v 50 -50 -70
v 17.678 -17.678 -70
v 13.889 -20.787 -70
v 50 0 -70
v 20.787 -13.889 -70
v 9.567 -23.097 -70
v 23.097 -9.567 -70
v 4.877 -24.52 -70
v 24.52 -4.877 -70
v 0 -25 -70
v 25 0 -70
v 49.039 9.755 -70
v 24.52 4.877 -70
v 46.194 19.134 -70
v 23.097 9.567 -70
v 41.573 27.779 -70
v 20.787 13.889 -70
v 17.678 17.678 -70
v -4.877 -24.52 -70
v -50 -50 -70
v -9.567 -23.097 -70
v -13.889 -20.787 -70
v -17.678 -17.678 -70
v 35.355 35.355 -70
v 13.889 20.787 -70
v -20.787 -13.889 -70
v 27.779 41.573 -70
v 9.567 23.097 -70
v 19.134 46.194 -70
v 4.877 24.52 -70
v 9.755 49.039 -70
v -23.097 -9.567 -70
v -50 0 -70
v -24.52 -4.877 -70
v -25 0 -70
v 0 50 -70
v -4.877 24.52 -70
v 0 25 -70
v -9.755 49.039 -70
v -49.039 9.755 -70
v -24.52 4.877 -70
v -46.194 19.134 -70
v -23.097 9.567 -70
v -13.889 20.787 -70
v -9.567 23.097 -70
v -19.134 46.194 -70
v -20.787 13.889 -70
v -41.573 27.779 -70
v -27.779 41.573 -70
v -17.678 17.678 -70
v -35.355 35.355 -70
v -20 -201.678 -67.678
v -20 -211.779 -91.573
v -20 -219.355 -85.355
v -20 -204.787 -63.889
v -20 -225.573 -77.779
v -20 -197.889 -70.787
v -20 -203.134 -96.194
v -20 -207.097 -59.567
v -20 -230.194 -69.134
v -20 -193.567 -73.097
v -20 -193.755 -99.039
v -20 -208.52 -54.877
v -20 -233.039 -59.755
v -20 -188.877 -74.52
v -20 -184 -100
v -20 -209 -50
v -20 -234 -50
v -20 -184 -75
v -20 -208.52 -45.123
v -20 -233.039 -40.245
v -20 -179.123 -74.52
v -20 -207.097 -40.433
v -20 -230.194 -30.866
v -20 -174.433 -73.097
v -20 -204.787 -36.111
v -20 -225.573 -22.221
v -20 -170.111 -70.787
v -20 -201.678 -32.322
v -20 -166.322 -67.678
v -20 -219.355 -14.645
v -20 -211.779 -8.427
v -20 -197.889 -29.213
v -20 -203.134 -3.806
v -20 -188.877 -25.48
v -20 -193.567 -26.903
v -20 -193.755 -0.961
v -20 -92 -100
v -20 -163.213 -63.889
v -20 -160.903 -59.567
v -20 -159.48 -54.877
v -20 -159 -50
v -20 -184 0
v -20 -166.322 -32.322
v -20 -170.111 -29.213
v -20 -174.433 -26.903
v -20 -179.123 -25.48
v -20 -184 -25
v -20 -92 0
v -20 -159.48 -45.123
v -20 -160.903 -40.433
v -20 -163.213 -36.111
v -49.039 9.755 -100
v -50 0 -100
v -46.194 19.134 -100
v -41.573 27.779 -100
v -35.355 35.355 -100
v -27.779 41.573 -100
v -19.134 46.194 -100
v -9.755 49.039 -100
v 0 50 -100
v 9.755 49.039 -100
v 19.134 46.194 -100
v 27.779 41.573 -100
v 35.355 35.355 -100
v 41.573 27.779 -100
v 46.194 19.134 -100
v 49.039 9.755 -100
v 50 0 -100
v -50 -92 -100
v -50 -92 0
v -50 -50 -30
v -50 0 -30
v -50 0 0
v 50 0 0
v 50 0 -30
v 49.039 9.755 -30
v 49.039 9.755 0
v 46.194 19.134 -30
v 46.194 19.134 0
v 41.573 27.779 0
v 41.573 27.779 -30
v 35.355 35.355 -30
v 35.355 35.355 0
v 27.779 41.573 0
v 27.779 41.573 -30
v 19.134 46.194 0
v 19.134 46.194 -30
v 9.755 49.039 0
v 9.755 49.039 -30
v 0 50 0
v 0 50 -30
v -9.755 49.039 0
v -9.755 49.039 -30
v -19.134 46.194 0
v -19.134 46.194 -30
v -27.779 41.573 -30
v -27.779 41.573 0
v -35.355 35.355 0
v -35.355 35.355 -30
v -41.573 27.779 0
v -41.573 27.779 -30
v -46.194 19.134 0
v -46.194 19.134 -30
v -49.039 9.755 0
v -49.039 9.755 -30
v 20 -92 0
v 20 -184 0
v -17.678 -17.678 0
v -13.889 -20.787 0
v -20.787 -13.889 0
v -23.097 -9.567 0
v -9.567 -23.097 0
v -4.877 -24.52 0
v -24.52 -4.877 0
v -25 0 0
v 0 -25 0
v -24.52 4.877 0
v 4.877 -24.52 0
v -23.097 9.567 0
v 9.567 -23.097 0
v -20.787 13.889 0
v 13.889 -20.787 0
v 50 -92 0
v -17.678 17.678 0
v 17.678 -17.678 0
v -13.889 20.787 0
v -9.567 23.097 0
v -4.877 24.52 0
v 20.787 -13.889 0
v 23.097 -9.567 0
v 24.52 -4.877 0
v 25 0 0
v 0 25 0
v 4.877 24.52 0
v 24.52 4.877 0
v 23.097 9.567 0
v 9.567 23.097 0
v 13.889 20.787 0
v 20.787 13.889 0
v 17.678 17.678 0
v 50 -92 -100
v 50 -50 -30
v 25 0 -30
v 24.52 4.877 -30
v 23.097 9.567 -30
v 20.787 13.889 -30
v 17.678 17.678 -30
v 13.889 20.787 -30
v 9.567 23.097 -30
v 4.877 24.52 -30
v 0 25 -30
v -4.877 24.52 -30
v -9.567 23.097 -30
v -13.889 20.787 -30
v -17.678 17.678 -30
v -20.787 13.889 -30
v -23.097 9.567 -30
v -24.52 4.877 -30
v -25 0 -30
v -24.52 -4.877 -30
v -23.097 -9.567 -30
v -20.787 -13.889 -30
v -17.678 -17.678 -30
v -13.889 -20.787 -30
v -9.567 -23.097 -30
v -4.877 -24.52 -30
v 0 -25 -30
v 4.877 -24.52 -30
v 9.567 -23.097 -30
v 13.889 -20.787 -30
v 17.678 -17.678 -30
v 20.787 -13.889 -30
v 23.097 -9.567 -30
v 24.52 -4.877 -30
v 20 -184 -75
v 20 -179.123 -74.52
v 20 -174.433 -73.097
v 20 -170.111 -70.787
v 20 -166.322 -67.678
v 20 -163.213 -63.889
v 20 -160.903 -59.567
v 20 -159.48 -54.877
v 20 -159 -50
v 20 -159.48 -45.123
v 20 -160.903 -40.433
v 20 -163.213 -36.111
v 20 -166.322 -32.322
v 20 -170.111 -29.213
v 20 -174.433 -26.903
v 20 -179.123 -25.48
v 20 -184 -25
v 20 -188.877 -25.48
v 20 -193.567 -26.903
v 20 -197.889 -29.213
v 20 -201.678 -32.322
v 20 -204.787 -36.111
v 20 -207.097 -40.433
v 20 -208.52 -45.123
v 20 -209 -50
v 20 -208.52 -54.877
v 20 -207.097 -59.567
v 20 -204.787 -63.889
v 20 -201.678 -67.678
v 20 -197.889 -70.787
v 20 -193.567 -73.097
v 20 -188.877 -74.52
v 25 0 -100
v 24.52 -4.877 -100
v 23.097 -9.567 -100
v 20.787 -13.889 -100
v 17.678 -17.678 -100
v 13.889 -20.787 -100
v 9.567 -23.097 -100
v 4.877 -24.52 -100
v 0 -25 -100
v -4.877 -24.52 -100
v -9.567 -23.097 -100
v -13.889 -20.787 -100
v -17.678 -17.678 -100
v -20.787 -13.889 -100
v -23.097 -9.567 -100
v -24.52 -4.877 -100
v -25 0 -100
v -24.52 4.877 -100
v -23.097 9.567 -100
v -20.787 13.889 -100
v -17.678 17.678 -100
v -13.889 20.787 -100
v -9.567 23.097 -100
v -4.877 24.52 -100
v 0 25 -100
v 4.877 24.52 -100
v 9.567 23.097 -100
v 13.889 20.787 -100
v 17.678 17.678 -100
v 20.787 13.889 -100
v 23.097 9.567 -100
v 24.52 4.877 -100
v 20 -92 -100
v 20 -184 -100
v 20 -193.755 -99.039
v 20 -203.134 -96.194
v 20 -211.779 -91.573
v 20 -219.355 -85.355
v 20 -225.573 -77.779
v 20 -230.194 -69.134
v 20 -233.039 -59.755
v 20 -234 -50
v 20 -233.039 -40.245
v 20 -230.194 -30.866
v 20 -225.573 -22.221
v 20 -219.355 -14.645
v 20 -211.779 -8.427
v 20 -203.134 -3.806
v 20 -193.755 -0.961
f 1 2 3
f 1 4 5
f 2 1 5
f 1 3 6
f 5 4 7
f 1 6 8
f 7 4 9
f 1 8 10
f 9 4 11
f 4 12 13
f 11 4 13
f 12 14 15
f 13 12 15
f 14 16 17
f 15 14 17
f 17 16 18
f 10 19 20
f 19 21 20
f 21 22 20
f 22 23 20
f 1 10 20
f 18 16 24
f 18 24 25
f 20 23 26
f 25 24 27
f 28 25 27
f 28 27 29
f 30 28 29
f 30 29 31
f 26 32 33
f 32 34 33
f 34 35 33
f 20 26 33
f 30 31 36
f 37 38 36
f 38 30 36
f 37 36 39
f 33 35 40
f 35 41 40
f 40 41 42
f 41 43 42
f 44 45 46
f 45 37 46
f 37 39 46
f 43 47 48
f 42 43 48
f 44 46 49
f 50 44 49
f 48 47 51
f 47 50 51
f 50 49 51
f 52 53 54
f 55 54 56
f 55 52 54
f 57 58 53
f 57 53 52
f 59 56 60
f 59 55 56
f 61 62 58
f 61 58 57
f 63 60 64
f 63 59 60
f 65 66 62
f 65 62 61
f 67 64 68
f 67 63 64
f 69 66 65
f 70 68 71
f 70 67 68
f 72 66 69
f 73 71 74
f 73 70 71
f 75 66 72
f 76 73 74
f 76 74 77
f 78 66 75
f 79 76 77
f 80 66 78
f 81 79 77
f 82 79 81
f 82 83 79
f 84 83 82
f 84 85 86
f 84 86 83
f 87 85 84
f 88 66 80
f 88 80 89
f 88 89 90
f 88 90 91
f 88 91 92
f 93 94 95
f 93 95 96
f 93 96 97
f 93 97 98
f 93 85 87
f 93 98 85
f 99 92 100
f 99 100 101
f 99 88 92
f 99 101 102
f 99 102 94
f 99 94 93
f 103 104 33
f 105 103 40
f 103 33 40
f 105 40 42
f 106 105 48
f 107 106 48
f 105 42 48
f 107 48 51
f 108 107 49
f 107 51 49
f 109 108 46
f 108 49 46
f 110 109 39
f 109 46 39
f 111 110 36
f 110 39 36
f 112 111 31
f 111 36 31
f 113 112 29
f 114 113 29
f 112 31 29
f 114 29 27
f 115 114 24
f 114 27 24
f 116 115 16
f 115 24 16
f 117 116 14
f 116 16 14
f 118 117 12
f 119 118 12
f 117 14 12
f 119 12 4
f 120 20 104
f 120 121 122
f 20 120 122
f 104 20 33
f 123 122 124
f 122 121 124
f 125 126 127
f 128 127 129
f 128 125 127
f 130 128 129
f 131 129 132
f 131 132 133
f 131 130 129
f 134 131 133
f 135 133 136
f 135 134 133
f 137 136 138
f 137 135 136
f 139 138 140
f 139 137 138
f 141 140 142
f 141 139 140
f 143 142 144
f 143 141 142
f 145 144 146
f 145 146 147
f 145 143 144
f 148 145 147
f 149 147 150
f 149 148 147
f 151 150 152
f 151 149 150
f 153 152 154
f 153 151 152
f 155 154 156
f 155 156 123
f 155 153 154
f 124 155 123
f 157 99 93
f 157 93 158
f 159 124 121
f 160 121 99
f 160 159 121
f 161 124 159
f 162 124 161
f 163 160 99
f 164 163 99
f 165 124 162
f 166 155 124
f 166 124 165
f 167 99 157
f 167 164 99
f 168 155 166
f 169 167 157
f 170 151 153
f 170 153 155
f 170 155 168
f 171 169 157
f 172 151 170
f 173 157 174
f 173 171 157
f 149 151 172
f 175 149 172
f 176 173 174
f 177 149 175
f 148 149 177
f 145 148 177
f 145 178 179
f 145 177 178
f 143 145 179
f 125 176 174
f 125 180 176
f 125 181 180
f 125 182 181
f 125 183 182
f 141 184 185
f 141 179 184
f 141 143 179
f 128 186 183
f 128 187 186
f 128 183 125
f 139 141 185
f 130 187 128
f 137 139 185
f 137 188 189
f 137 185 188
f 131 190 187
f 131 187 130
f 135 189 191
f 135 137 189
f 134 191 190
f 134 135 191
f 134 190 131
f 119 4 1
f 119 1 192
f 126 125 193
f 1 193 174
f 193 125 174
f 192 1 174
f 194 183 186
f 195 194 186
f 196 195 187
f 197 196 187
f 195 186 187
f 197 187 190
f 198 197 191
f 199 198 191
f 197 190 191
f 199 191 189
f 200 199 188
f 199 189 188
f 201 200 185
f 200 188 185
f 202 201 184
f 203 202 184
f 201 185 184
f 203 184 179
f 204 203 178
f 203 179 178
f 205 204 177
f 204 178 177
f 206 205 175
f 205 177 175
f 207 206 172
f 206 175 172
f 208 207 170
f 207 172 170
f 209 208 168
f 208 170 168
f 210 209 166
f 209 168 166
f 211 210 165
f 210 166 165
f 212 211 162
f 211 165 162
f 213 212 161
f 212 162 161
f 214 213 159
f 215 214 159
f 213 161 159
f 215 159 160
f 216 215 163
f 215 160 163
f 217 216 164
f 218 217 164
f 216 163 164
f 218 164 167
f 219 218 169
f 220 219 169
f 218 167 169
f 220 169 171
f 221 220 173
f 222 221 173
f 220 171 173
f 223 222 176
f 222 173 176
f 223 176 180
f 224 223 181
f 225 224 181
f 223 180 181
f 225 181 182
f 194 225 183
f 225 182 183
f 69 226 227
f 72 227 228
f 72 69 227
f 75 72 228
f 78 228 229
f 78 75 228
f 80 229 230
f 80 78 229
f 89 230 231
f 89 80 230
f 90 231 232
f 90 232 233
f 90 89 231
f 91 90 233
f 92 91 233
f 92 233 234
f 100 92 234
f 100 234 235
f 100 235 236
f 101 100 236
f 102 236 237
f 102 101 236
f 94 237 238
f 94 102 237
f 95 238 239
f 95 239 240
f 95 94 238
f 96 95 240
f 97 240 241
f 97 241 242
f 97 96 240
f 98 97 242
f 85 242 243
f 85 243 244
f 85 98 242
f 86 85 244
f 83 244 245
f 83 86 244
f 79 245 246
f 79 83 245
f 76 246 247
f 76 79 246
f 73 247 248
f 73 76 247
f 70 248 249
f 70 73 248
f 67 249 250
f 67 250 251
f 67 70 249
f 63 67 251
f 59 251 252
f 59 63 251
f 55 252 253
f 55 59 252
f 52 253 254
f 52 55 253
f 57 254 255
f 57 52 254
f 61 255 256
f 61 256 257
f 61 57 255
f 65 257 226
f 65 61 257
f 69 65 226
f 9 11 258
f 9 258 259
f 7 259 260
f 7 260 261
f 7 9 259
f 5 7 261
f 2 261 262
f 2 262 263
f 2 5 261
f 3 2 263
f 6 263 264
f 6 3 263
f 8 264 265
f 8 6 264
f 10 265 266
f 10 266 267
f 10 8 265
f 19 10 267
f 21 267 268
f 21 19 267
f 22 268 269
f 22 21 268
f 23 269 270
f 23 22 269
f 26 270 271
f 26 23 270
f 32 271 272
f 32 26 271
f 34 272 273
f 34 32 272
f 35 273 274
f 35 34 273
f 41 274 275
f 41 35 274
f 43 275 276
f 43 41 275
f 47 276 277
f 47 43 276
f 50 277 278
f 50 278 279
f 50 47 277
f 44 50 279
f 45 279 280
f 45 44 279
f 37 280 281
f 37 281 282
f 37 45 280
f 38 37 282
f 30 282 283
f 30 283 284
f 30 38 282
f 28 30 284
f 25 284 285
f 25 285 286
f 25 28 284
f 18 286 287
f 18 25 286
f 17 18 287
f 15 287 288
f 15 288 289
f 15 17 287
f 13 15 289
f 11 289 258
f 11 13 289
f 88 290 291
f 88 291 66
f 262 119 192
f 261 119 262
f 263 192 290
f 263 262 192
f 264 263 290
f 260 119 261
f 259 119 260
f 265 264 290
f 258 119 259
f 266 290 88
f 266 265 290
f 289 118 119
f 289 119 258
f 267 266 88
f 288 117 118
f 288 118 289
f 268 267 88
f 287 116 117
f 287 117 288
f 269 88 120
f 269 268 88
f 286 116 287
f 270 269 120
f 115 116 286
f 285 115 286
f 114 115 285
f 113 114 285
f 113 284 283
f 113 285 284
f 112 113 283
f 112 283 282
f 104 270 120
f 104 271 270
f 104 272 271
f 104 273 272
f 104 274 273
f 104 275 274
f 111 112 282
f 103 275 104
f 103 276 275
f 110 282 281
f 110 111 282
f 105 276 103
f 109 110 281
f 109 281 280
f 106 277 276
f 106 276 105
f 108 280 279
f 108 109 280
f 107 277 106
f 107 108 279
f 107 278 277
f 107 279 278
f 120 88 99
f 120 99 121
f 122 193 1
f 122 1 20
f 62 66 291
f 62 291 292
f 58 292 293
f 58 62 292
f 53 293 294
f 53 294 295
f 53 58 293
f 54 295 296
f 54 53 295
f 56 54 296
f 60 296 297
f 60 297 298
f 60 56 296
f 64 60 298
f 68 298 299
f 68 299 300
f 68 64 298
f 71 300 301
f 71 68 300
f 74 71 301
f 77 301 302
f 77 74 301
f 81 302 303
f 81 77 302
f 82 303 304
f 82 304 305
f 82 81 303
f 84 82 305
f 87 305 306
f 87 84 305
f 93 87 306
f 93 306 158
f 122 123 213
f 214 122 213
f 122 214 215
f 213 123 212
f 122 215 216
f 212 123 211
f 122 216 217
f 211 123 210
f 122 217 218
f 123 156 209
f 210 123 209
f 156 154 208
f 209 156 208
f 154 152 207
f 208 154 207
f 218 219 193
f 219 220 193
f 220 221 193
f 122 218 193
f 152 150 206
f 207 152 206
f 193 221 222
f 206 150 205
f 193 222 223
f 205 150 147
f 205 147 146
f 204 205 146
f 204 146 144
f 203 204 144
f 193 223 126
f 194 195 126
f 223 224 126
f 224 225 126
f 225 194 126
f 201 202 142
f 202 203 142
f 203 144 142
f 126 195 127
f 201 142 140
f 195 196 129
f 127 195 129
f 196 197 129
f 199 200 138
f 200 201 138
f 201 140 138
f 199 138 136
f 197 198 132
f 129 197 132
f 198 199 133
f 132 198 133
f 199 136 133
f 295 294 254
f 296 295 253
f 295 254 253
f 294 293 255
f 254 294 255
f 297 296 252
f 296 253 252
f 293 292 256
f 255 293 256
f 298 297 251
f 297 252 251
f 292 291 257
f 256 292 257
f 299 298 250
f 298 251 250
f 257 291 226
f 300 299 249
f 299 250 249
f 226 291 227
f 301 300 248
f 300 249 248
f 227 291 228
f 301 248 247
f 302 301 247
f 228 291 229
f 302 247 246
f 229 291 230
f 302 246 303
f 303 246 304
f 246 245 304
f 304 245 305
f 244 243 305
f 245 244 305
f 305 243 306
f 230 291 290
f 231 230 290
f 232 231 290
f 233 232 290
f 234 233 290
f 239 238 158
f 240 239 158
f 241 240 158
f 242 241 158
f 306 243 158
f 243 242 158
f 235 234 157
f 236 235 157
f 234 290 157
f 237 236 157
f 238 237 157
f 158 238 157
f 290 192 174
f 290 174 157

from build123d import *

# Parameters (mm, degrees)
CROQUIS1_R                   = 25
CROQUIS1_W                   = 100
CROQUIS1_H                   = 42
SALIENTE_EXTRUIR1_DEPTH      = 30
CROQUIS4_W                   = 100
CROQUIS4_H                   = 42
SALIENTE_EXTRUIR2_DEPTH      = 40
CROQUIS5_R                   = 25
SALIENTE_EXTRUIR3_DEPTH      = 30
SALIENTE_EXTRUIR4_DEPTH      = 20
SALIENTE_EXTRUIR4_DEPTH_BACK = 20
CROQUIS6_R                   = 25


with BuildPart() as part:
    # Croquis1 → Saliente-Extruir1 (new body)
    # profile 1 of 2: a face of its own
    with BuildSketch(Plane.XY):
        with BuildLine():
            ThreePointArc((50, 0), (0, 50), (-50, 0))
            Line((-50, 0), (-50, -50))
            Line((-50, -50), (50, -50))
            Line((50, -50), (50, 0))
        make_face()
        Circle(CROQUIS1_R, mode=Mode.SUBTRACT)
    # profile 2 of 2: a face of its own
    with BuildSketch(Plane.XY):
        with Locations((0, -71)):
            Rectangle(CROQUIS1_W, CROQUIS1_H)
    extrude(amount=-SALIENTE_EXTRUIR1_DEPTH)

    # Croquis4 → Saliente-Extruir2 (add)
    with BuildSketch(Plane(origin=(0, 0, -30), x_dir=(-1, 0, 0), z_dir=(0, 0, -1))):
        with Locations((0, -71)):
            Rectangle(CROQUIS4_W, CROQUIS4_H)
    extrude(amount=SALIENTE_EXTRUIR2_DEPTH)

    # Croquis5 → Saliente-Extruir3 (add)
    with BuildSketch(Plane(origin=(0, 0, -70), x_dir=(-1, 0, 0), z_dir=(0, 0, -1))):
        with BuildLine():
            Line((-50, 0), (-50, -92))
            Line((-50, -92), (50, -92))
            Line((50, -92), (50, 0))
            ThreePointArc((50, 0), (0, 50), (-50, 0))
        make_face()
        with Locations(Location((0, 0, 0), (0, 0, 180))):
            Circle(CROQUIS5_R, mode=Mode.SUBTRACT)
    extrude(amount=SALIENTE_EXTRUIR3_DEPTH)

    # Croquis6 → Saliente-Extruir4 (add, two sides: drawn at the far end of the back side and taken through both)
    with BuildSketch(Plane(origin=(0, 0, 0), x_dir=(0, 0, -1), z_dir=(1, 0, 0)).offset(-SALIENTE_EXTRUIR4_DEPTH_BACK)):
        with BuildLine():
            Line((0, -184), (0, -92))
            Line((0, -92), (100, -92))
            Line((100, -92), (100, -184))
            ThreePointArc((100, -184), (50, -234), (0, -184))
        make_face()
        with Locations((50, -184)):
            Circle(CROQUIS6_R, mode=Mode.SUBTRACT)
    extrude(amount=SALIENTE_EXTRUIR4_DEPTH + SALIENTE_EXTRUIR4_DEPTH_BACK)


solid = part.part
